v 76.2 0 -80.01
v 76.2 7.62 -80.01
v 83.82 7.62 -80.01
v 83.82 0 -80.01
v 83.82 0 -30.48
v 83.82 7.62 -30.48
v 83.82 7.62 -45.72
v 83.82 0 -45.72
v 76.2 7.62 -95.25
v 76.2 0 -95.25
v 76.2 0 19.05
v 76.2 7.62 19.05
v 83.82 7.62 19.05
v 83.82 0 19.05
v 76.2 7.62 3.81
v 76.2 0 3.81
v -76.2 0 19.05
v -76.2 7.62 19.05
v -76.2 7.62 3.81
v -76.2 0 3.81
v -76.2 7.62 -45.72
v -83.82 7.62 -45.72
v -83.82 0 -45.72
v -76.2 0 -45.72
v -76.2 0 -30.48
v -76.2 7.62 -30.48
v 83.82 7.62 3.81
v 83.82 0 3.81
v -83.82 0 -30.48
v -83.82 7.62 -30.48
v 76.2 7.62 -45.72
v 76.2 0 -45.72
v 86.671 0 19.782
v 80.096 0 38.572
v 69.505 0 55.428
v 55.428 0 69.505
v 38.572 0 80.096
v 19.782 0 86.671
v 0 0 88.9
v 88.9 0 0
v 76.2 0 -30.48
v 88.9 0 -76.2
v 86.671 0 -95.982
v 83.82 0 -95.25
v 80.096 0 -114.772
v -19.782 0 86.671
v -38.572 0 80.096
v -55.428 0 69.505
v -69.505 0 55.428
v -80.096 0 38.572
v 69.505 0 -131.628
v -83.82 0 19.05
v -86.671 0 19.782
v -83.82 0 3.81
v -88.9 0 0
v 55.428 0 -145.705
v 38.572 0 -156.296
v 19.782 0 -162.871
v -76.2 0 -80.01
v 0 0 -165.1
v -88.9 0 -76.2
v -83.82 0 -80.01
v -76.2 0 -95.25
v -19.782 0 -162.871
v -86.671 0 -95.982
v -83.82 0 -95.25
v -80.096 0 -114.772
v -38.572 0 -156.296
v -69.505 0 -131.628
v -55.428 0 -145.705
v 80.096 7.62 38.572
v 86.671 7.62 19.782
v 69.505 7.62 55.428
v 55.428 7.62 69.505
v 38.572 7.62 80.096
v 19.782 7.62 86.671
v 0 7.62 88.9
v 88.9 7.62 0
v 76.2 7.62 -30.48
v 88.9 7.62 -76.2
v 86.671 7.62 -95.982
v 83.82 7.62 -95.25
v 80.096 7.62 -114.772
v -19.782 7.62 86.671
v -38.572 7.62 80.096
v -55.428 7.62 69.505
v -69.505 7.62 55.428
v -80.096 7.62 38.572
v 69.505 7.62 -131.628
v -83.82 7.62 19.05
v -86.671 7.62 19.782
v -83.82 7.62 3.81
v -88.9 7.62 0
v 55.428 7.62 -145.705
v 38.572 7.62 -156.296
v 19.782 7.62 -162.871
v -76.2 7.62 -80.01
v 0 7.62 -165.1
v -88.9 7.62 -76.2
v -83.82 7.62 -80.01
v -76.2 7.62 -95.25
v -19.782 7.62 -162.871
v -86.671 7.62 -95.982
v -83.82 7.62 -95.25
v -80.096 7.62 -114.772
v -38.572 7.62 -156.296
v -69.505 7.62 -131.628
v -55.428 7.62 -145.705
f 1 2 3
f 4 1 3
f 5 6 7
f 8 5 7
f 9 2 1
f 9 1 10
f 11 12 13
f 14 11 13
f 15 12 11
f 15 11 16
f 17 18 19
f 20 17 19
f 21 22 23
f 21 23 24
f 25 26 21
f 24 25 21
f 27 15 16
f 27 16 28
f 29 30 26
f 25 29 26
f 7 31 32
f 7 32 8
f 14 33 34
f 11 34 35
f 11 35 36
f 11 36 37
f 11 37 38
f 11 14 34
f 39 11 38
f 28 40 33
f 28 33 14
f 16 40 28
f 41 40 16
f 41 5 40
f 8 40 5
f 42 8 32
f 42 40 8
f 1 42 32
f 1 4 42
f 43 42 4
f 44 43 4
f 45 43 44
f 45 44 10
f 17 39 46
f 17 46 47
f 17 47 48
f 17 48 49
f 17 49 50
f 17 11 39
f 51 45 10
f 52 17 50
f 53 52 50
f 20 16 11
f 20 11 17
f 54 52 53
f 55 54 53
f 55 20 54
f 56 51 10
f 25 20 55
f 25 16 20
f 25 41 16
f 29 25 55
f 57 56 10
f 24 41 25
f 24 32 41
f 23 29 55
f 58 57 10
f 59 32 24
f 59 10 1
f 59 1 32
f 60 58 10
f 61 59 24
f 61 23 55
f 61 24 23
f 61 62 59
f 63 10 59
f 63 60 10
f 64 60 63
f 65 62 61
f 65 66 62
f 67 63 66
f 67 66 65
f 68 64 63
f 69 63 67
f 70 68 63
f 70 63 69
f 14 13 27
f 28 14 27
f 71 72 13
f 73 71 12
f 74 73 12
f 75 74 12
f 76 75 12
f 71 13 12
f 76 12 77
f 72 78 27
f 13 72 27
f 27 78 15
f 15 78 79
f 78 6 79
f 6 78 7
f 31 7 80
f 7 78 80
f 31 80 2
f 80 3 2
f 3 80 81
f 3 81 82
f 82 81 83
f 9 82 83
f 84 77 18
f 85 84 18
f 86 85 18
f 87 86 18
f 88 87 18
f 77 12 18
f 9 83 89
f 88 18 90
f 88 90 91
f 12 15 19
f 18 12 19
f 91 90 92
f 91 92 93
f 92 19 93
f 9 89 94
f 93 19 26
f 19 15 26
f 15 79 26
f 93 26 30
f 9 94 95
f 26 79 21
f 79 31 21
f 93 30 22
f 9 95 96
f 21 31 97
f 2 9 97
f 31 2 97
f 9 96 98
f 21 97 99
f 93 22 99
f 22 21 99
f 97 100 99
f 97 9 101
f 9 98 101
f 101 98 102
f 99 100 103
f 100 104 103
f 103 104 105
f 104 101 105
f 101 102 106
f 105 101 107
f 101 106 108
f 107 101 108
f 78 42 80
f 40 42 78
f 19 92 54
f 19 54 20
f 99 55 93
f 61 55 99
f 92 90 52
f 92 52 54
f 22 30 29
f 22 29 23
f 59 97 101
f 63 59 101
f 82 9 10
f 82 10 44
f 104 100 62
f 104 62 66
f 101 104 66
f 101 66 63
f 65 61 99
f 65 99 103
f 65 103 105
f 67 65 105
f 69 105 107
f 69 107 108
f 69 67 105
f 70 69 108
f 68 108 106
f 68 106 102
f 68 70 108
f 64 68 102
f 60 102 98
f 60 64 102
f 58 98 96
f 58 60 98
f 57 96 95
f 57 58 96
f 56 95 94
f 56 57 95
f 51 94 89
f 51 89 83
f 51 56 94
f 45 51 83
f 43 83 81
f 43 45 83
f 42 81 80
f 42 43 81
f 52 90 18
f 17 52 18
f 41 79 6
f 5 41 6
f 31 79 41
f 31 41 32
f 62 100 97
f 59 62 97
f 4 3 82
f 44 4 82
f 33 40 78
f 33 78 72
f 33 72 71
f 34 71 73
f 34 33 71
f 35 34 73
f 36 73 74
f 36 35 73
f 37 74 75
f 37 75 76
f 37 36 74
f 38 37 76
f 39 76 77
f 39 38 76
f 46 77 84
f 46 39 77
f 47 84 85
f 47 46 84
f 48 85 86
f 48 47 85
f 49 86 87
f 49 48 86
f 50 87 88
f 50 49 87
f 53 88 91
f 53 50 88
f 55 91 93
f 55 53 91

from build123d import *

# Parameters (mm, degrees)
BOSS_EXTRUDE1_DEPTH = 7.62
SKETCH5_W           = 7.62
SKETCH5_H           = 15.24
CUT_EXTRUDE5_DEPTH  = 8.62


with BuildPart() as part:
    # Sketch1 → Boss-Extrude1 (new body)
    with BuildSketch(Plane(origin=(0, 0, 0), x_dir=(1, 0, 0), z_dir=(0, 1, 0))):
        with BuildLine():
            Line((-88.9, 0), (-88.9, 76.2))
            ThreePointArc((-88.9, 76.2), (0, 165.1), (88.9, 76.2))
            Line((88.9, 76.2), (88.9, 0))
            ThreePointArc((88.9, 0), (0, -88.9), (-88.9, 0))
        make_face()
    extrude(amount=BOSS_EXTRUDE1_DEPTH)

    # Sketch5 → Cut-Extrude5 (cut, through all)
    with BuildSketch(Plane(origin=(0, 7.62, 0), x_dir=(1, 0, 0), z_dir=(0, 1, 0))):
        with Locations((80.01, -11.43)):
            Rectangle(SKETCH5_W, SKETCH5_H)
        with Locations((-80.01, -11.43)):
            Rectangle(SKETCH5_W, SKETCH5_H)
        with Locations((-80.01, 87.63)):
            Rectangle(SKETCH5_W, SKETCH5_H)
        with Locations((80.01, 87.63)):
            Rectangle(SKETCH5_W, SKETCH5_H)
        with Locations((80.01, 38.1)):
            Rectangle(SKETCH5_W, SKETCH5_H)
        with Locations((-80.01, 38.1)):
            Rectangle(SKETCH5_W, SKETCH5_H)
    extrude(amount=-CUT_EXTRUDE5_DEPTH, mode=Mode.SUBTRACT)


solid = part.part
